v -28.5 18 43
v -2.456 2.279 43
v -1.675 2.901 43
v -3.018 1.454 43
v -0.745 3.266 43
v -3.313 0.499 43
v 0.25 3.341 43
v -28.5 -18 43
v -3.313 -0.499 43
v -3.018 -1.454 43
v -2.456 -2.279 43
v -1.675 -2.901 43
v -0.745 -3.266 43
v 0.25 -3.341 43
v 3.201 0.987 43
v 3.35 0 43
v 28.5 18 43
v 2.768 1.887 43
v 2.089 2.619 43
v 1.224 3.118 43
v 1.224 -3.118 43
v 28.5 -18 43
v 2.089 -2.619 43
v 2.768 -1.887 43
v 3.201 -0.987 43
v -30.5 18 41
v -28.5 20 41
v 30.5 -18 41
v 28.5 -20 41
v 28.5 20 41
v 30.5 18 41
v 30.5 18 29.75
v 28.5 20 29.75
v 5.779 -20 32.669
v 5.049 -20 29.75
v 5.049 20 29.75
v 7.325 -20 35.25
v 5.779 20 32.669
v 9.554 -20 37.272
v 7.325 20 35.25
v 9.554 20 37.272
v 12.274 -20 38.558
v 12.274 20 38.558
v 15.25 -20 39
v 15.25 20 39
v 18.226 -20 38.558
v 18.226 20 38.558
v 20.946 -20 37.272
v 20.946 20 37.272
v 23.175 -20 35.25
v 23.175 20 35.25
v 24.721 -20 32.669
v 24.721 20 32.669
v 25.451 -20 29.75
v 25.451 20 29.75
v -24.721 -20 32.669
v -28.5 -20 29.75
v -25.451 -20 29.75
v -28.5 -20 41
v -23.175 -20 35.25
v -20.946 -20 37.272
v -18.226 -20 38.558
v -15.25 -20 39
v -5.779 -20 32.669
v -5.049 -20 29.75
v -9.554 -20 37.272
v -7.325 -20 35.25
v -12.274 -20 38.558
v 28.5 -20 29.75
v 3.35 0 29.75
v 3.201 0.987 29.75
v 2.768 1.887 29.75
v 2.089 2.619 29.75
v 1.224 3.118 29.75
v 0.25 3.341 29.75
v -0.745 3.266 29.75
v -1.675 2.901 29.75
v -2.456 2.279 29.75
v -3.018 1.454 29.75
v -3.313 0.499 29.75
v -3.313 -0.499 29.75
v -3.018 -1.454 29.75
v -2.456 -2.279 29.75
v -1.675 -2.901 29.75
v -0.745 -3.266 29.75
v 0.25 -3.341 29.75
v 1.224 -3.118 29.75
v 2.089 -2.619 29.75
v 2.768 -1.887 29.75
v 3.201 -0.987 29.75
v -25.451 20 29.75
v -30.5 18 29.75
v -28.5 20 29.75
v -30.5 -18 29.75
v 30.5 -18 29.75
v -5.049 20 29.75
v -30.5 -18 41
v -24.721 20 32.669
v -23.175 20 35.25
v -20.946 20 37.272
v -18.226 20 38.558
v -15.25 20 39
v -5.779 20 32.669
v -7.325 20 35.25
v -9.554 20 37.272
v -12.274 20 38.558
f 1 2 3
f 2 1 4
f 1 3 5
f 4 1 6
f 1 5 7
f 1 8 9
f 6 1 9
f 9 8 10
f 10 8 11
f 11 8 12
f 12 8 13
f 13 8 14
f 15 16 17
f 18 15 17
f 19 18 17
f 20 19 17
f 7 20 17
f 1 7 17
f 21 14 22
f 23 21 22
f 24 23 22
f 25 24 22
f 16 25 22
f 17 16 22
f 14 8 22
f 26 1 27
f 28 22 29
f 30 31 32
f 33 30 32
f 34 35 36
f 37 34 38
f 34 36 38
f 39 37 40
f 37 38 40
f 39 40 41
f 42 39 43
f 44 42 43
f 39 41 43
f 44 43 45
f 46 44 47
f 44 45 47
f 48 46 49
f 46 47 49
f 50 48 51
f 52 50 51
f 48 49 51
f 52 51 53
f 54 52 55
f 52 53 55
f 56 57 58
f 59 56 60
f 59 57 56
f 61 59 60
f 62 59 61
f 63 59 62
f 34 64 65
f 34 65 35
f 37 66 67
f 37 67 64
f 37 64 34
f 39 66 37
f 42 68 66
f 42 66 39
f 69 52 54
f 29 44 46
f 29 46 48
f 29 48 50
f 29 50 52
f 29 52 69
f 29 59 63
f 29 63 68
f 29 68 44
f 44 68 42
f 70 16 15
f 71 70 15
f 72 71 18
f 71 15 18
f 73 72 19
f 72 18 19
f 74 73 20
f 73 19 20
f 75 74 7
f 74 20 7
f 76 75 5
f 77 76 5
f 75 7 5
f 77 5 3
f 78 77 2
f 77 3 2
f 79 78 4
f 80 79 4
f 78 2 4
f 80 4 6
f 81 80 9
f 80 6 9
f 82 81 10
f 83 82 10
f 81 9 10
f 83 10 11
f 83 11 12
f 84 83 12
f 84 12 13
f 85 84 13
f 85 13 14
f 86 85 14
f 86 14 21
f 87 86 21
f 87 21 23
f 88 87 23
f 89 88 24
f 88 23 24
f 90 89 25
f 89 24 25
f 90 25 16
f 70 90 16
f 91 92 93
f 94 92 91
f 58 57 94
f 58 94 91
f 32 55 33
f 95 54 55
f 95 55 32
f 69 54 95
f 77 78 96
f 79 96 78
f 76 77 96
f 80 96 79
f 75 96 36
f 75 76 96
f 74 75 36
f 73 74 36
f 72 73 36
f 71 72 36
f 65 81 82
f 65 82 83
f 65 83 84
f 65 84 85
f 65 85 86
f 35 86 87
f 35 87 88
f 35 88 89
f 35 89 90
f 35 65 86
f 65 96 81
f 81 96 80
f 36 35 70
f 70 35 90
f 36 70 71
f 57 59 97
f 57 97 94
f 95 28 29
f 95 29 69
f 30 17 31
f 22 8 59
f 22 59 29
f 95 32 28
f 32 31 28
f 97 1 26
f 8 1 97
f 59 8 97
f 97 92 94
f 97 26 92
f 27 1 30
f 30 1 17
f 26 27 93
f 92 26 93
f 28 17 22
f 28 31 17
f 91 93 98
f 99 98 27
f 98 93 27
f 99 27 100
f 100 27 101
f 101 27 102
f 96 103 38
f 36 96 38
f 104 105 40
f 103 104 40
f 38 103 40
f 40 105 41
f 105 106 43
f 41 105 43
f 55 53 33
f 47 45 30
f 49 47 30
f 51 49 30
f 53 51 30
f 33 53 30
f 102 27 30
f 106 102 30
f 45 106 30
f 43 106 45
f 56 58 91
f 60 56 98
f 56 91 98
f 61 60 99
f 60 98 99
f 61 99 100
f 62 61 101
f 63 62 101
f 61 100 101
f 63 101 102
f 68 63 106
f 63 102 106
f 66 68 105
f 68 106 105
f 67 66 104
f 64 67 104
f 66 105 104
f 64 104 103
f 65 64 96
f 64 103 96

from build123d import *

# Parameters (mm, degrees)
SKETCH002_W             = 61
SKETCH002_H             = 40
PAD001_DEPTH            = 13.25
POCKET_DEPTH            = 40
SKETCH007_R             = 3.35
POCKET001_DEPTH         = 13.25
CHAMFER_SIZE            = 2
BODY002_PLACEMENT_ANGLE = 180


with BuildPart() as part:
    # Sketch002 → Pad001 (new body)
    with BuildSketch(Plane.XY):
        Rectangle(SKETCH002_W, SKETCH002_H)
    extrude(amount=PAD001_DEPTH)

    # Sketch003 (on Face3 of Pad001) → Pocket (cut)
    with BuildSketch(Plane.XZ.offset(20)):
        with BuildLine():
            ThreePointArc((-25.5, 14.25), (-15.25, 4), (-5, 14.25))
            Line((-25.5, 14.25), (-5, 14.25))
        make_face()
        with BuildLine():
            ThreePointArc((5, 14.25), (15.25, 4), (25.5, 14.25))
            Line((5, 14.25), (25.5, 14.25))
        make_face()
    extrude(amount=-POCKET_DEPTH, mode=Mode.SUBTRACT)


with BuildPart() as part_1:
    # Body001 placement: moved
    add(part.part.moved(Location((0, 0, 7))))

    # Sketch007 (on DatumPlane) → Pocket001 (cut)
    with BuildSketch(Plane(origin=(0, 0, 7), x_dir=(1, 0, 0), z_dir=(0, 0, -1))):
        Circle(SKETCH007_R)
    extrude(amount=-POCKET001_DEPTH, mode=Mode.SUBTRACT)

    # Chamfer
    chamfer_edges = [part_1.edges().sort_by_distance(p)[0] for p in [
        (30.5, 0, 7),
        (0, -20, 7),
        (-30.5, 0, 7),
        (0, 20, 7),
        (30.5, -20, 13.625),
        (30.5, 20, 13.625),
        (-30.5, 20, 13.625),
        (-30.5, -20, 13.625),
    ]]
    chamfer(chamfer_edges, length=CHAMFER_SIZE)


with BuildPart() as part_2:
    # Body002 placement: moved
    add(part_1.part.moved(Location((0, 0, 50))).rotate(Axis((0, 0, 50), (1, 0, 0)), BODY002_PLACEMENT_ANGLE))


solid = part_2.part
